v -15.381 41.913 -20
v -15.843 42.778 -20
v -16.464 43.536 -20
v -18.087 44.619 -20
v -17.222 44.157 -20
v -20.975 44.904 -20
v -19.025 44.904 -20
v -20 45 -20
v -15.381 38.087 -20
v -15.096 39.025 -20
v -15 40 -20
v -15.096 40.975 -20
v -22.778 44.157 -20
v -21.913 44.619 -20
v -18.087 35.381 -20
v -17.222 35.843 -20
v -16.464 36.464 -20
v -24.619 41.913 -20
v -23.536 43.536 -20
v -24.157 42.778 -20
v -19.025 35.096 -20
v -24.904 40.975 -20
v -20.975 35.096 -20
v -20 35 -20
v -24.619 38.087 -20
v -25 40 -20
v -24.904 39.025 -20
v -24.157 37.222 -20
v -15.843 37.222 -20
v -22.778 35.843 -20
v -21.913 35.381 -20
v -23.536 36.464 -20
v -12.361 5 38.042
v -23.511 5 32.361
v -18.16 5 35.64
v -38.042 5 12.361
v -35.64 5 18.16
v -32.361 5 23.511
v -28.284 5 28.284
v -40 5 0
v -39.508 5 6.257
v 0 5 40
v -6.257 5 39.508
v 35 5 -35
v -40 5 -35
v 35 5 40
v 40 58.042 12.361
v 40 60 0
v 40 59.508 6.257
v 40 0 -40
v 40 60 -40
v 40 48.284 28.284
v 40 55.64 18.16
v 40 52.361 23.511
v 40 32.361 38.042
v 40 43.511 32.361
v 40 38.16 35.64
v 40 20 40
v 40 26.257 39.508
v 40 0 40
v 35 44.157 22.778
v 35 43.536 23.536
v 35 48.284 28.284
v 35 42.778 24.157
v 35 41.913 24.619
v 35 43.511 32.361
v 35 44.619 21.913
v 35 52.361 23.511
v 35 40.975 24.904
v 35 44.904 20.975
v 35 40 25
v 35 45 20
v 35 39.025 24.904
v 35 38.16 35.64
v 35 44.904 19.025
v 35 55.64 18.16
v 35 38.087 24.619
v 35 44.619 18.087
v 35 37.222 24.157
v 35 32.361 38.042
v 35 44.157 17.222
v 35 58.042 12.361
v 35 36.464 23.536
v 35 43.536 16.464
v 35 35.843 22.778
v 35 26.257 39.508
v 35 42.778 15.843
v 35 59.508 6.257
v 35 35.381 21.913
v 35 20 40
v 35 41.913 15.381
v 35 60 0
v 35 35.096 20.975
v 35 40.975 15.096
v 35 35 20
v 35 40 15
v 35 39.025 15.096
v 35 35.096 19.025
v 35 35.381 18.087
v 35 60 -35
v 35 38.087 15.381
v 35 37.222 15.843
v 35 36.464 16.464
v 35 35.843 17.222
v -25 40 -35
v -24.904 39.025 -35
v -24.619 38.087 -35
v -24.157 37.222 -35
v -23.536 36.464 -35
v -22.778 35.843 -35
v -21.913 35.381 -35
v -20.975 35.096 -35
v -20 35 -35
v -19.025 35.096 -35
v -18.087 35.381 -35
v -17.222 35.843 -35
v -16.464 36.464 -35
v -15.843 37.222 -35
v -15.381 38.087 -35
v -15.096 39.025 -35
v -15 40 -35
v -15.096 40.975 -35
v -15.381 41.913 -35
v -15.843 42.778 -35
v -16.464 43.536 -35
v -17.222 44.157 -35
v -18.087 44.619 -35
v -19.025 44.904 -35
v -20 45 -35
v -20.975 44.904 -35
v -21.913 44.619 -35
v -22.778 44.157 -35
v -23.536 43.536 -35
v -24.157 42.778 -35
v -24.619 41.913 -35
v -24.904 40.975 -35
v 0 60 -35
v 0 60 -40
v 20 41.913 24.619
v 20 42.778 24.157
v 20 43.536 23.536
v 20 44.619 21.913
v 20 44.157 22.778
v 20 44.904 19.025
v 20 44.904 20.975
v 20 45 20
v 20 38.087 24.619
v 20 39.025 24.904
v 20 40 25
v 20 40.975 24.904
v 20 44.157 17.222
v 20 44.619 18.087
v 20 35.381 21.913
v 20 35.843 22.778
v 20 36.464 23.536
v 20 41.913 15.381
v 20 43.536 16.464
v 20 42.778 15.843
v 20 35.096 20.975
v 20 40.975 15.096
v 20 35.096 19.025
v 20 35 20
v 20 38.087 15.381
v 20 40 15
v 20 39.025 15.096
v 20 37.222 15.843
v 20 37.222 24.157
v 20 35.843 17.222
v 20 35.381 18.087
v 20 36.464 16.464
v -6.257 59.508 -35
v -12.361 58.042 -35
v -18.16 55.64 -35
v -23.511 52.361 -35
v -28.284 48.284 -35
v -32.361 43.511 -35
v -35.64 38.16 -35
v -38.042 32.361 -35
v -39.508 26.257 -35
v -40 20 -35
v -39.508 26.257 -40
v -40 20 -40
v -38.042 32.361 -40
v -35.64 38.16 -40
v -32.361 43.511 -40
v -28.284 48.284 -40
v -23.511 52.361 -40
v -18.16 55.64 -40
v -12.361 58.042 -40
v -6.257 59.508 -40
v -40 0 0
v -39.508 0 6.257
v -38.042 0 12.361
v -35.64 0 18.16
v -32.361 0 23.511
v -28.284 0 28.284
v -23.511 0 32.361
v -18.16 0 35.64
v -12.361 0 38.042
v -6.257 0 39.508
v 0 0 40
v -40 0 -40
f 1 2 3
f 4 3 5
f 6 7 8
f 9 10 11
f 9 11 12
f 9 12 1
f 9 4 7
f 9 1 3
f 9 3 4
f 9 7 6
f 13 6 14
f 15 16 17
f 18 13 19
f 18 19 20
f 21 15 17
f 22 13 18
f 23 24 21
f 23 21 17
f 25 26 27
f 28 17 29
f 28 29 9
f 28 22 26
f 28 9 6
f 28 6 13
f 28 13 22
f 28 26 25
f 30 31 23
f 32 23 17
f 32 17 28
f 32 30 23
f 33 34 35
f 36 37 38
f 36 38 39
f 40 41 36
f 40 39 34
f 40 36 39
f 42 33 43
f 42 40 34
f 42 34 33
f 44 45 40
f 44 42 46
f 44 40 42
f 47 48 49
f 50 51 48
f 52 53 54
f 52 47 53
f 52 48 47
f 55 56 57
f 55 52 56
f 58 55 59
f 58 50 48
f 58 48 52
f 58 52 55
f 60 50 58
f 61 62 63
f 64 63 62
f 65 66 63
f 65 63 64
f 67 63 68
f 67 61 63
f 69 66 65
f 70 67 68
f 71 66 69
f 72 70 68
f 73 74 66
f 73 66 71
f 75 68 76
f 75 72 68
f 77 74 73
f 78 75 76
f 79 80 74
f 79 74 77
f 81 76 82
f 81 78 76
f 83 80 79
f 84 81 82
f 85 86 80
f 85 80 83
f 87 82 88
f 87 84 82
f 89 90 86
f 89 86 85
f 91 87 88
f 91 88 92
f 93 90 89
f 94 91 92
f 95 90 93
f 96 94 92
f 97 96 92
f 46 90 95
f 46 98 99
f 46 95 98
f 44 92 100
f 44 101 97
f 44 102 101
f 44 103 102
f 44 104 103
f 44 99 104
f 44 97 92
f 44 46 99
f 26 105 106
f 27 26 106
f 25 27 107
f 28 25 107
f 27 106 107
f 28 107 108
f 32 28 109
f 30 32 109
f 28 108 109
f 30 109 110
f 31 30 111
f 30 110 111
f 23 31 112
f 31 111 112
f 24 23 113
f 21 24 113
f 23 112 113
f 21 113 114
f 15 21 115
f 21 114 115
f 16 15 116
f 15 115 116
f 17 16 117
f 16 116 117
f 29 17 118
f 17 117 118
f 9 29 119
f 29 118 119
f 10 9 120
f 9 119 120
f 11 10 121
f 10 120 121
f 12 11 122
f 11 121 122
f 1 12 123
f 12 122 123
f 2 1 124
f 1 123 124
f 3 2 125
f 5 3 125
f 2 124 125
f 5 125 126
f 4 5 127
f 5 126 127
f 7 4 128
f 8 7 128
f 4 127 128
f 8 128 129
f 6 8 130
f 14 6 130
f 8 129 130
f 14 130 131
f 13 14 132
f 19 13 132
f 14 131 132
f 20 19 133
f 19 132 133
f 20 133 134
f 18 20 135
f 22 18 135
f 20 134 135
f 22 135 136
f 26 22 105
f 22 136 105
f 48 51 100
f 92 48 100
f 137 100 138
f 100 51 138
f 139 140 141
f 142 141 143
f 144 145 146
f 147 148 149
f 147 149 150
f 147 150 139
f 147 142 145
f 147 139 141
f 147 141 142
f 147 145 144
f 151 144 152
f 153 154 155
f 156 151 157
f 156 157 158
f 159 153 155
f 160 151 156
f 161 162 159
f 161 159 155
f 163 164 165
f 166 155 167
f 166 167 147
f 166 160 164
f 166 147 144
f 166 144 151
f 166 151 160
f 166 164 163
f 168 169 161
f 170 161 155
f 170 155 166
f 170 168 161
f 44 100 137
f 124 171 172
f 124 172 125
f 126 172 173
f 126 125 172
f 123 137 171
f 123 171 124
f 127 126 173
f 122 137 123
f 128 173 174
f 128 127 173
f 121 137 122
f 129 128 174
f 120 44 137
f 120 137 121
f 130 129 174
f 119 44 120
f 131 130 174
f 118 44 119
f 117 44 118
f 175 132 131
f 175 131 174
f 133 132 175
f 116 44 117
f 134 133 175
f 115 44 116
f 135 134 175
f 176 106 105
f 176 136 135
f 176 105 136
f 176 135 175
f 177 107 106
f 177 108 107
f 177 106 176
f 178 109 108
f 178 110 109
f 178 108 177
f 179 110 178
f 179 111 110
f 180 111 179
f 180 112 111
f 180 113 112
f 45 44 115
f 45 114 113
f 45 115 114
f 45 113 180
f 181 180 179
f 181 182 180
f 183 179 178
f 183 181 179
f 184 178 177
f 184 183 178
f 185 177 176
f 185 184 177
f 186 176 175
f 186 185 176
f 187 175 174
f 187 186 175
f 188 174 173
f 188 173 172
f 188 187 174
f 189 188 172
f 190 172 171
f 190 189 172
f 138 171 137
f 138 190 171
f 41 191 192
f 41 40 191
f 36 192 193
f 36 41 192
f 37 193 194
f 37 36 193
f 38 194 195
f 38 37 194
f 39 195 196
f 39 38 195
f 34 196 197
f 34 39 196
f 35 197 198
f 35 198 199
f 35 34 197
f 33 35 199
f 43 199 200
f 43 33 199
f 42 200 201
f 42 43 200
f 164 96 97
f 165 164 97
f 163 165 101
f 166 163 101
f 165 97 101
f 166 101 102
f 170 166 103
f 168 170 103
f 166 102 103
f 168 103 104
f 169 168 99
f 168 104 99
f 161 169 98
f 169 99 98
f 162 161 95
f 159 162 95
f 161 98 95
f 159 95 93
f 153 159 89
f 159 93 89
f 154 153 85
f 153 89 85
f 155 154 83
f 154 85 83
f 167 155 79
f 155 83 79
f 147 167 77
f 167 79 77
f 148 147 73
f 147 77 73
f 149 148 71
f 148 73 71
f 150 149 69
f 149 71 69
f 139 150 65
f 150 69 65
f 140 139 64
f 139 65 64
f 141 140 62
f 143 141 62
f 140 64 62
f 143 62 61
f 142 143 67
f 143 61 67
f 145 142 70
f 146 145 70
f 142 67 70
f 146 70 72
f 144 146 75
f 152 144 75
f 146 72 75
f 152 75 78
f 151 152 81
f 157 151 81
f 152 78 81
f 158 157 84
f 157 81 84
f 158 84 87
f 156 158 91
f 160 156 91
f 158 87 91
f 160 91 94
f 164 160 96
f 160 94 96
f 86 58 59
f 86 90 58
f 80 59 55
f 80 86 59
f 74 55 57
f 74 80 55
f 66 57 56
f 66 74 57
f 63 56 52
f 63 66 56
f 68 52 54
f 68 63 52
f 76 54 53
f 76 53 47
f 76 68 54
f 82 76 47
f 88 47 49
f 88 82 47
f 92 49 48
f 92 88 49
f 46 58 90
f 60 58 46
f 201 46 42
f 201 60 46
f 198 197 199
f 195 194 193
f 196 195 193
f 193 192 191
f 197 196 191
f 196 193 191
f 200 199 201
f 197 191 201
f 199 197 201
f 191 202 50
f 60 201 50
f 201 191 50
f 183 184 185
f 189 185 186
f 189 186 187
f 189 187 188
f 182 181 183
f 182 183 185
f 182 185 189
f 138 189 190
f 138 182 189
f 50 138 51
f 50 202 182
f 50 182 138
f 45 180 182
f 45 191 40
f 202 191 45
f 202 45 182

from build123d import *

# Parameters (mm, degrees)
SKETCH1_W           = 80
SKETCH1_H           = 80
BOSS_EXTRUDE1_DEPTH = 5
EXTRUDE_THIN1_DEPTH = 55
FILLET1_R           = 40
SKETCH4_R           = 5
BOSS_EXTRUDE2_DEPTH = 15
SKETCH5_R           = 5
BOSS_EXTRUDE3_DEPTH = 15


with BuildPart() as part:
    # Sketch1 → Boss-Extrude1 (new body)
    with BuildSketch(Plane(origin=(0, 0, 0), x_dir=(1, 0, 0), z_dir=(0, 1, 0))):
        Rectangle(SKETCH1_W, SKETCH1_H)
    extrude(amount=BOSS_EXTRUDE1_DEPTH)

    # Sketch3 → Extrude-Thin1 (add)
    with BuildSketch(Plane(origin=(0, 5, 0), x_dir=(1, 0, 0), z_dir=(0, 1, 0))):
        Polygon((-40, 40), (40, 40), (40, -40), (35, -40), (35, 35), (-40, 35), align=None)
    extrude(amount=EXTRUDE_THIN1_DEPTH)

    # Fillet1
    fillet1_edges = [part.edges().sort_by_distance(p)[0] for p in [
        (37.5, 60, 40),
        (-40, 60, -37.5),
        (-40, 2.5, 40),
    ]]
    fillet(fillet1_edges, radius=FILLET1_R)

    # Sketch4 → Boss-Extrude2 (add)
    with BuildSketch(Plane.ZY.offset(-35)):
        with Locations(Location((20, 40, 0), (0, 0, 180))):
            Circle(SKETCH4_R)
    extrude(amount=BOSS_EXTRUDE2_DEPTH)

    # Sketch5 → Boss-Extrude3 (add)
    with BuildSketch(Plane.XY.offset(-35)):
        with Locations(Location((-20, 40, 0), (0, 0, 180))):
            Circle(SKETCH5_R)
    extrude(amount=BOSS_EXTRUDE3_DEPTH)


solid = part.part
